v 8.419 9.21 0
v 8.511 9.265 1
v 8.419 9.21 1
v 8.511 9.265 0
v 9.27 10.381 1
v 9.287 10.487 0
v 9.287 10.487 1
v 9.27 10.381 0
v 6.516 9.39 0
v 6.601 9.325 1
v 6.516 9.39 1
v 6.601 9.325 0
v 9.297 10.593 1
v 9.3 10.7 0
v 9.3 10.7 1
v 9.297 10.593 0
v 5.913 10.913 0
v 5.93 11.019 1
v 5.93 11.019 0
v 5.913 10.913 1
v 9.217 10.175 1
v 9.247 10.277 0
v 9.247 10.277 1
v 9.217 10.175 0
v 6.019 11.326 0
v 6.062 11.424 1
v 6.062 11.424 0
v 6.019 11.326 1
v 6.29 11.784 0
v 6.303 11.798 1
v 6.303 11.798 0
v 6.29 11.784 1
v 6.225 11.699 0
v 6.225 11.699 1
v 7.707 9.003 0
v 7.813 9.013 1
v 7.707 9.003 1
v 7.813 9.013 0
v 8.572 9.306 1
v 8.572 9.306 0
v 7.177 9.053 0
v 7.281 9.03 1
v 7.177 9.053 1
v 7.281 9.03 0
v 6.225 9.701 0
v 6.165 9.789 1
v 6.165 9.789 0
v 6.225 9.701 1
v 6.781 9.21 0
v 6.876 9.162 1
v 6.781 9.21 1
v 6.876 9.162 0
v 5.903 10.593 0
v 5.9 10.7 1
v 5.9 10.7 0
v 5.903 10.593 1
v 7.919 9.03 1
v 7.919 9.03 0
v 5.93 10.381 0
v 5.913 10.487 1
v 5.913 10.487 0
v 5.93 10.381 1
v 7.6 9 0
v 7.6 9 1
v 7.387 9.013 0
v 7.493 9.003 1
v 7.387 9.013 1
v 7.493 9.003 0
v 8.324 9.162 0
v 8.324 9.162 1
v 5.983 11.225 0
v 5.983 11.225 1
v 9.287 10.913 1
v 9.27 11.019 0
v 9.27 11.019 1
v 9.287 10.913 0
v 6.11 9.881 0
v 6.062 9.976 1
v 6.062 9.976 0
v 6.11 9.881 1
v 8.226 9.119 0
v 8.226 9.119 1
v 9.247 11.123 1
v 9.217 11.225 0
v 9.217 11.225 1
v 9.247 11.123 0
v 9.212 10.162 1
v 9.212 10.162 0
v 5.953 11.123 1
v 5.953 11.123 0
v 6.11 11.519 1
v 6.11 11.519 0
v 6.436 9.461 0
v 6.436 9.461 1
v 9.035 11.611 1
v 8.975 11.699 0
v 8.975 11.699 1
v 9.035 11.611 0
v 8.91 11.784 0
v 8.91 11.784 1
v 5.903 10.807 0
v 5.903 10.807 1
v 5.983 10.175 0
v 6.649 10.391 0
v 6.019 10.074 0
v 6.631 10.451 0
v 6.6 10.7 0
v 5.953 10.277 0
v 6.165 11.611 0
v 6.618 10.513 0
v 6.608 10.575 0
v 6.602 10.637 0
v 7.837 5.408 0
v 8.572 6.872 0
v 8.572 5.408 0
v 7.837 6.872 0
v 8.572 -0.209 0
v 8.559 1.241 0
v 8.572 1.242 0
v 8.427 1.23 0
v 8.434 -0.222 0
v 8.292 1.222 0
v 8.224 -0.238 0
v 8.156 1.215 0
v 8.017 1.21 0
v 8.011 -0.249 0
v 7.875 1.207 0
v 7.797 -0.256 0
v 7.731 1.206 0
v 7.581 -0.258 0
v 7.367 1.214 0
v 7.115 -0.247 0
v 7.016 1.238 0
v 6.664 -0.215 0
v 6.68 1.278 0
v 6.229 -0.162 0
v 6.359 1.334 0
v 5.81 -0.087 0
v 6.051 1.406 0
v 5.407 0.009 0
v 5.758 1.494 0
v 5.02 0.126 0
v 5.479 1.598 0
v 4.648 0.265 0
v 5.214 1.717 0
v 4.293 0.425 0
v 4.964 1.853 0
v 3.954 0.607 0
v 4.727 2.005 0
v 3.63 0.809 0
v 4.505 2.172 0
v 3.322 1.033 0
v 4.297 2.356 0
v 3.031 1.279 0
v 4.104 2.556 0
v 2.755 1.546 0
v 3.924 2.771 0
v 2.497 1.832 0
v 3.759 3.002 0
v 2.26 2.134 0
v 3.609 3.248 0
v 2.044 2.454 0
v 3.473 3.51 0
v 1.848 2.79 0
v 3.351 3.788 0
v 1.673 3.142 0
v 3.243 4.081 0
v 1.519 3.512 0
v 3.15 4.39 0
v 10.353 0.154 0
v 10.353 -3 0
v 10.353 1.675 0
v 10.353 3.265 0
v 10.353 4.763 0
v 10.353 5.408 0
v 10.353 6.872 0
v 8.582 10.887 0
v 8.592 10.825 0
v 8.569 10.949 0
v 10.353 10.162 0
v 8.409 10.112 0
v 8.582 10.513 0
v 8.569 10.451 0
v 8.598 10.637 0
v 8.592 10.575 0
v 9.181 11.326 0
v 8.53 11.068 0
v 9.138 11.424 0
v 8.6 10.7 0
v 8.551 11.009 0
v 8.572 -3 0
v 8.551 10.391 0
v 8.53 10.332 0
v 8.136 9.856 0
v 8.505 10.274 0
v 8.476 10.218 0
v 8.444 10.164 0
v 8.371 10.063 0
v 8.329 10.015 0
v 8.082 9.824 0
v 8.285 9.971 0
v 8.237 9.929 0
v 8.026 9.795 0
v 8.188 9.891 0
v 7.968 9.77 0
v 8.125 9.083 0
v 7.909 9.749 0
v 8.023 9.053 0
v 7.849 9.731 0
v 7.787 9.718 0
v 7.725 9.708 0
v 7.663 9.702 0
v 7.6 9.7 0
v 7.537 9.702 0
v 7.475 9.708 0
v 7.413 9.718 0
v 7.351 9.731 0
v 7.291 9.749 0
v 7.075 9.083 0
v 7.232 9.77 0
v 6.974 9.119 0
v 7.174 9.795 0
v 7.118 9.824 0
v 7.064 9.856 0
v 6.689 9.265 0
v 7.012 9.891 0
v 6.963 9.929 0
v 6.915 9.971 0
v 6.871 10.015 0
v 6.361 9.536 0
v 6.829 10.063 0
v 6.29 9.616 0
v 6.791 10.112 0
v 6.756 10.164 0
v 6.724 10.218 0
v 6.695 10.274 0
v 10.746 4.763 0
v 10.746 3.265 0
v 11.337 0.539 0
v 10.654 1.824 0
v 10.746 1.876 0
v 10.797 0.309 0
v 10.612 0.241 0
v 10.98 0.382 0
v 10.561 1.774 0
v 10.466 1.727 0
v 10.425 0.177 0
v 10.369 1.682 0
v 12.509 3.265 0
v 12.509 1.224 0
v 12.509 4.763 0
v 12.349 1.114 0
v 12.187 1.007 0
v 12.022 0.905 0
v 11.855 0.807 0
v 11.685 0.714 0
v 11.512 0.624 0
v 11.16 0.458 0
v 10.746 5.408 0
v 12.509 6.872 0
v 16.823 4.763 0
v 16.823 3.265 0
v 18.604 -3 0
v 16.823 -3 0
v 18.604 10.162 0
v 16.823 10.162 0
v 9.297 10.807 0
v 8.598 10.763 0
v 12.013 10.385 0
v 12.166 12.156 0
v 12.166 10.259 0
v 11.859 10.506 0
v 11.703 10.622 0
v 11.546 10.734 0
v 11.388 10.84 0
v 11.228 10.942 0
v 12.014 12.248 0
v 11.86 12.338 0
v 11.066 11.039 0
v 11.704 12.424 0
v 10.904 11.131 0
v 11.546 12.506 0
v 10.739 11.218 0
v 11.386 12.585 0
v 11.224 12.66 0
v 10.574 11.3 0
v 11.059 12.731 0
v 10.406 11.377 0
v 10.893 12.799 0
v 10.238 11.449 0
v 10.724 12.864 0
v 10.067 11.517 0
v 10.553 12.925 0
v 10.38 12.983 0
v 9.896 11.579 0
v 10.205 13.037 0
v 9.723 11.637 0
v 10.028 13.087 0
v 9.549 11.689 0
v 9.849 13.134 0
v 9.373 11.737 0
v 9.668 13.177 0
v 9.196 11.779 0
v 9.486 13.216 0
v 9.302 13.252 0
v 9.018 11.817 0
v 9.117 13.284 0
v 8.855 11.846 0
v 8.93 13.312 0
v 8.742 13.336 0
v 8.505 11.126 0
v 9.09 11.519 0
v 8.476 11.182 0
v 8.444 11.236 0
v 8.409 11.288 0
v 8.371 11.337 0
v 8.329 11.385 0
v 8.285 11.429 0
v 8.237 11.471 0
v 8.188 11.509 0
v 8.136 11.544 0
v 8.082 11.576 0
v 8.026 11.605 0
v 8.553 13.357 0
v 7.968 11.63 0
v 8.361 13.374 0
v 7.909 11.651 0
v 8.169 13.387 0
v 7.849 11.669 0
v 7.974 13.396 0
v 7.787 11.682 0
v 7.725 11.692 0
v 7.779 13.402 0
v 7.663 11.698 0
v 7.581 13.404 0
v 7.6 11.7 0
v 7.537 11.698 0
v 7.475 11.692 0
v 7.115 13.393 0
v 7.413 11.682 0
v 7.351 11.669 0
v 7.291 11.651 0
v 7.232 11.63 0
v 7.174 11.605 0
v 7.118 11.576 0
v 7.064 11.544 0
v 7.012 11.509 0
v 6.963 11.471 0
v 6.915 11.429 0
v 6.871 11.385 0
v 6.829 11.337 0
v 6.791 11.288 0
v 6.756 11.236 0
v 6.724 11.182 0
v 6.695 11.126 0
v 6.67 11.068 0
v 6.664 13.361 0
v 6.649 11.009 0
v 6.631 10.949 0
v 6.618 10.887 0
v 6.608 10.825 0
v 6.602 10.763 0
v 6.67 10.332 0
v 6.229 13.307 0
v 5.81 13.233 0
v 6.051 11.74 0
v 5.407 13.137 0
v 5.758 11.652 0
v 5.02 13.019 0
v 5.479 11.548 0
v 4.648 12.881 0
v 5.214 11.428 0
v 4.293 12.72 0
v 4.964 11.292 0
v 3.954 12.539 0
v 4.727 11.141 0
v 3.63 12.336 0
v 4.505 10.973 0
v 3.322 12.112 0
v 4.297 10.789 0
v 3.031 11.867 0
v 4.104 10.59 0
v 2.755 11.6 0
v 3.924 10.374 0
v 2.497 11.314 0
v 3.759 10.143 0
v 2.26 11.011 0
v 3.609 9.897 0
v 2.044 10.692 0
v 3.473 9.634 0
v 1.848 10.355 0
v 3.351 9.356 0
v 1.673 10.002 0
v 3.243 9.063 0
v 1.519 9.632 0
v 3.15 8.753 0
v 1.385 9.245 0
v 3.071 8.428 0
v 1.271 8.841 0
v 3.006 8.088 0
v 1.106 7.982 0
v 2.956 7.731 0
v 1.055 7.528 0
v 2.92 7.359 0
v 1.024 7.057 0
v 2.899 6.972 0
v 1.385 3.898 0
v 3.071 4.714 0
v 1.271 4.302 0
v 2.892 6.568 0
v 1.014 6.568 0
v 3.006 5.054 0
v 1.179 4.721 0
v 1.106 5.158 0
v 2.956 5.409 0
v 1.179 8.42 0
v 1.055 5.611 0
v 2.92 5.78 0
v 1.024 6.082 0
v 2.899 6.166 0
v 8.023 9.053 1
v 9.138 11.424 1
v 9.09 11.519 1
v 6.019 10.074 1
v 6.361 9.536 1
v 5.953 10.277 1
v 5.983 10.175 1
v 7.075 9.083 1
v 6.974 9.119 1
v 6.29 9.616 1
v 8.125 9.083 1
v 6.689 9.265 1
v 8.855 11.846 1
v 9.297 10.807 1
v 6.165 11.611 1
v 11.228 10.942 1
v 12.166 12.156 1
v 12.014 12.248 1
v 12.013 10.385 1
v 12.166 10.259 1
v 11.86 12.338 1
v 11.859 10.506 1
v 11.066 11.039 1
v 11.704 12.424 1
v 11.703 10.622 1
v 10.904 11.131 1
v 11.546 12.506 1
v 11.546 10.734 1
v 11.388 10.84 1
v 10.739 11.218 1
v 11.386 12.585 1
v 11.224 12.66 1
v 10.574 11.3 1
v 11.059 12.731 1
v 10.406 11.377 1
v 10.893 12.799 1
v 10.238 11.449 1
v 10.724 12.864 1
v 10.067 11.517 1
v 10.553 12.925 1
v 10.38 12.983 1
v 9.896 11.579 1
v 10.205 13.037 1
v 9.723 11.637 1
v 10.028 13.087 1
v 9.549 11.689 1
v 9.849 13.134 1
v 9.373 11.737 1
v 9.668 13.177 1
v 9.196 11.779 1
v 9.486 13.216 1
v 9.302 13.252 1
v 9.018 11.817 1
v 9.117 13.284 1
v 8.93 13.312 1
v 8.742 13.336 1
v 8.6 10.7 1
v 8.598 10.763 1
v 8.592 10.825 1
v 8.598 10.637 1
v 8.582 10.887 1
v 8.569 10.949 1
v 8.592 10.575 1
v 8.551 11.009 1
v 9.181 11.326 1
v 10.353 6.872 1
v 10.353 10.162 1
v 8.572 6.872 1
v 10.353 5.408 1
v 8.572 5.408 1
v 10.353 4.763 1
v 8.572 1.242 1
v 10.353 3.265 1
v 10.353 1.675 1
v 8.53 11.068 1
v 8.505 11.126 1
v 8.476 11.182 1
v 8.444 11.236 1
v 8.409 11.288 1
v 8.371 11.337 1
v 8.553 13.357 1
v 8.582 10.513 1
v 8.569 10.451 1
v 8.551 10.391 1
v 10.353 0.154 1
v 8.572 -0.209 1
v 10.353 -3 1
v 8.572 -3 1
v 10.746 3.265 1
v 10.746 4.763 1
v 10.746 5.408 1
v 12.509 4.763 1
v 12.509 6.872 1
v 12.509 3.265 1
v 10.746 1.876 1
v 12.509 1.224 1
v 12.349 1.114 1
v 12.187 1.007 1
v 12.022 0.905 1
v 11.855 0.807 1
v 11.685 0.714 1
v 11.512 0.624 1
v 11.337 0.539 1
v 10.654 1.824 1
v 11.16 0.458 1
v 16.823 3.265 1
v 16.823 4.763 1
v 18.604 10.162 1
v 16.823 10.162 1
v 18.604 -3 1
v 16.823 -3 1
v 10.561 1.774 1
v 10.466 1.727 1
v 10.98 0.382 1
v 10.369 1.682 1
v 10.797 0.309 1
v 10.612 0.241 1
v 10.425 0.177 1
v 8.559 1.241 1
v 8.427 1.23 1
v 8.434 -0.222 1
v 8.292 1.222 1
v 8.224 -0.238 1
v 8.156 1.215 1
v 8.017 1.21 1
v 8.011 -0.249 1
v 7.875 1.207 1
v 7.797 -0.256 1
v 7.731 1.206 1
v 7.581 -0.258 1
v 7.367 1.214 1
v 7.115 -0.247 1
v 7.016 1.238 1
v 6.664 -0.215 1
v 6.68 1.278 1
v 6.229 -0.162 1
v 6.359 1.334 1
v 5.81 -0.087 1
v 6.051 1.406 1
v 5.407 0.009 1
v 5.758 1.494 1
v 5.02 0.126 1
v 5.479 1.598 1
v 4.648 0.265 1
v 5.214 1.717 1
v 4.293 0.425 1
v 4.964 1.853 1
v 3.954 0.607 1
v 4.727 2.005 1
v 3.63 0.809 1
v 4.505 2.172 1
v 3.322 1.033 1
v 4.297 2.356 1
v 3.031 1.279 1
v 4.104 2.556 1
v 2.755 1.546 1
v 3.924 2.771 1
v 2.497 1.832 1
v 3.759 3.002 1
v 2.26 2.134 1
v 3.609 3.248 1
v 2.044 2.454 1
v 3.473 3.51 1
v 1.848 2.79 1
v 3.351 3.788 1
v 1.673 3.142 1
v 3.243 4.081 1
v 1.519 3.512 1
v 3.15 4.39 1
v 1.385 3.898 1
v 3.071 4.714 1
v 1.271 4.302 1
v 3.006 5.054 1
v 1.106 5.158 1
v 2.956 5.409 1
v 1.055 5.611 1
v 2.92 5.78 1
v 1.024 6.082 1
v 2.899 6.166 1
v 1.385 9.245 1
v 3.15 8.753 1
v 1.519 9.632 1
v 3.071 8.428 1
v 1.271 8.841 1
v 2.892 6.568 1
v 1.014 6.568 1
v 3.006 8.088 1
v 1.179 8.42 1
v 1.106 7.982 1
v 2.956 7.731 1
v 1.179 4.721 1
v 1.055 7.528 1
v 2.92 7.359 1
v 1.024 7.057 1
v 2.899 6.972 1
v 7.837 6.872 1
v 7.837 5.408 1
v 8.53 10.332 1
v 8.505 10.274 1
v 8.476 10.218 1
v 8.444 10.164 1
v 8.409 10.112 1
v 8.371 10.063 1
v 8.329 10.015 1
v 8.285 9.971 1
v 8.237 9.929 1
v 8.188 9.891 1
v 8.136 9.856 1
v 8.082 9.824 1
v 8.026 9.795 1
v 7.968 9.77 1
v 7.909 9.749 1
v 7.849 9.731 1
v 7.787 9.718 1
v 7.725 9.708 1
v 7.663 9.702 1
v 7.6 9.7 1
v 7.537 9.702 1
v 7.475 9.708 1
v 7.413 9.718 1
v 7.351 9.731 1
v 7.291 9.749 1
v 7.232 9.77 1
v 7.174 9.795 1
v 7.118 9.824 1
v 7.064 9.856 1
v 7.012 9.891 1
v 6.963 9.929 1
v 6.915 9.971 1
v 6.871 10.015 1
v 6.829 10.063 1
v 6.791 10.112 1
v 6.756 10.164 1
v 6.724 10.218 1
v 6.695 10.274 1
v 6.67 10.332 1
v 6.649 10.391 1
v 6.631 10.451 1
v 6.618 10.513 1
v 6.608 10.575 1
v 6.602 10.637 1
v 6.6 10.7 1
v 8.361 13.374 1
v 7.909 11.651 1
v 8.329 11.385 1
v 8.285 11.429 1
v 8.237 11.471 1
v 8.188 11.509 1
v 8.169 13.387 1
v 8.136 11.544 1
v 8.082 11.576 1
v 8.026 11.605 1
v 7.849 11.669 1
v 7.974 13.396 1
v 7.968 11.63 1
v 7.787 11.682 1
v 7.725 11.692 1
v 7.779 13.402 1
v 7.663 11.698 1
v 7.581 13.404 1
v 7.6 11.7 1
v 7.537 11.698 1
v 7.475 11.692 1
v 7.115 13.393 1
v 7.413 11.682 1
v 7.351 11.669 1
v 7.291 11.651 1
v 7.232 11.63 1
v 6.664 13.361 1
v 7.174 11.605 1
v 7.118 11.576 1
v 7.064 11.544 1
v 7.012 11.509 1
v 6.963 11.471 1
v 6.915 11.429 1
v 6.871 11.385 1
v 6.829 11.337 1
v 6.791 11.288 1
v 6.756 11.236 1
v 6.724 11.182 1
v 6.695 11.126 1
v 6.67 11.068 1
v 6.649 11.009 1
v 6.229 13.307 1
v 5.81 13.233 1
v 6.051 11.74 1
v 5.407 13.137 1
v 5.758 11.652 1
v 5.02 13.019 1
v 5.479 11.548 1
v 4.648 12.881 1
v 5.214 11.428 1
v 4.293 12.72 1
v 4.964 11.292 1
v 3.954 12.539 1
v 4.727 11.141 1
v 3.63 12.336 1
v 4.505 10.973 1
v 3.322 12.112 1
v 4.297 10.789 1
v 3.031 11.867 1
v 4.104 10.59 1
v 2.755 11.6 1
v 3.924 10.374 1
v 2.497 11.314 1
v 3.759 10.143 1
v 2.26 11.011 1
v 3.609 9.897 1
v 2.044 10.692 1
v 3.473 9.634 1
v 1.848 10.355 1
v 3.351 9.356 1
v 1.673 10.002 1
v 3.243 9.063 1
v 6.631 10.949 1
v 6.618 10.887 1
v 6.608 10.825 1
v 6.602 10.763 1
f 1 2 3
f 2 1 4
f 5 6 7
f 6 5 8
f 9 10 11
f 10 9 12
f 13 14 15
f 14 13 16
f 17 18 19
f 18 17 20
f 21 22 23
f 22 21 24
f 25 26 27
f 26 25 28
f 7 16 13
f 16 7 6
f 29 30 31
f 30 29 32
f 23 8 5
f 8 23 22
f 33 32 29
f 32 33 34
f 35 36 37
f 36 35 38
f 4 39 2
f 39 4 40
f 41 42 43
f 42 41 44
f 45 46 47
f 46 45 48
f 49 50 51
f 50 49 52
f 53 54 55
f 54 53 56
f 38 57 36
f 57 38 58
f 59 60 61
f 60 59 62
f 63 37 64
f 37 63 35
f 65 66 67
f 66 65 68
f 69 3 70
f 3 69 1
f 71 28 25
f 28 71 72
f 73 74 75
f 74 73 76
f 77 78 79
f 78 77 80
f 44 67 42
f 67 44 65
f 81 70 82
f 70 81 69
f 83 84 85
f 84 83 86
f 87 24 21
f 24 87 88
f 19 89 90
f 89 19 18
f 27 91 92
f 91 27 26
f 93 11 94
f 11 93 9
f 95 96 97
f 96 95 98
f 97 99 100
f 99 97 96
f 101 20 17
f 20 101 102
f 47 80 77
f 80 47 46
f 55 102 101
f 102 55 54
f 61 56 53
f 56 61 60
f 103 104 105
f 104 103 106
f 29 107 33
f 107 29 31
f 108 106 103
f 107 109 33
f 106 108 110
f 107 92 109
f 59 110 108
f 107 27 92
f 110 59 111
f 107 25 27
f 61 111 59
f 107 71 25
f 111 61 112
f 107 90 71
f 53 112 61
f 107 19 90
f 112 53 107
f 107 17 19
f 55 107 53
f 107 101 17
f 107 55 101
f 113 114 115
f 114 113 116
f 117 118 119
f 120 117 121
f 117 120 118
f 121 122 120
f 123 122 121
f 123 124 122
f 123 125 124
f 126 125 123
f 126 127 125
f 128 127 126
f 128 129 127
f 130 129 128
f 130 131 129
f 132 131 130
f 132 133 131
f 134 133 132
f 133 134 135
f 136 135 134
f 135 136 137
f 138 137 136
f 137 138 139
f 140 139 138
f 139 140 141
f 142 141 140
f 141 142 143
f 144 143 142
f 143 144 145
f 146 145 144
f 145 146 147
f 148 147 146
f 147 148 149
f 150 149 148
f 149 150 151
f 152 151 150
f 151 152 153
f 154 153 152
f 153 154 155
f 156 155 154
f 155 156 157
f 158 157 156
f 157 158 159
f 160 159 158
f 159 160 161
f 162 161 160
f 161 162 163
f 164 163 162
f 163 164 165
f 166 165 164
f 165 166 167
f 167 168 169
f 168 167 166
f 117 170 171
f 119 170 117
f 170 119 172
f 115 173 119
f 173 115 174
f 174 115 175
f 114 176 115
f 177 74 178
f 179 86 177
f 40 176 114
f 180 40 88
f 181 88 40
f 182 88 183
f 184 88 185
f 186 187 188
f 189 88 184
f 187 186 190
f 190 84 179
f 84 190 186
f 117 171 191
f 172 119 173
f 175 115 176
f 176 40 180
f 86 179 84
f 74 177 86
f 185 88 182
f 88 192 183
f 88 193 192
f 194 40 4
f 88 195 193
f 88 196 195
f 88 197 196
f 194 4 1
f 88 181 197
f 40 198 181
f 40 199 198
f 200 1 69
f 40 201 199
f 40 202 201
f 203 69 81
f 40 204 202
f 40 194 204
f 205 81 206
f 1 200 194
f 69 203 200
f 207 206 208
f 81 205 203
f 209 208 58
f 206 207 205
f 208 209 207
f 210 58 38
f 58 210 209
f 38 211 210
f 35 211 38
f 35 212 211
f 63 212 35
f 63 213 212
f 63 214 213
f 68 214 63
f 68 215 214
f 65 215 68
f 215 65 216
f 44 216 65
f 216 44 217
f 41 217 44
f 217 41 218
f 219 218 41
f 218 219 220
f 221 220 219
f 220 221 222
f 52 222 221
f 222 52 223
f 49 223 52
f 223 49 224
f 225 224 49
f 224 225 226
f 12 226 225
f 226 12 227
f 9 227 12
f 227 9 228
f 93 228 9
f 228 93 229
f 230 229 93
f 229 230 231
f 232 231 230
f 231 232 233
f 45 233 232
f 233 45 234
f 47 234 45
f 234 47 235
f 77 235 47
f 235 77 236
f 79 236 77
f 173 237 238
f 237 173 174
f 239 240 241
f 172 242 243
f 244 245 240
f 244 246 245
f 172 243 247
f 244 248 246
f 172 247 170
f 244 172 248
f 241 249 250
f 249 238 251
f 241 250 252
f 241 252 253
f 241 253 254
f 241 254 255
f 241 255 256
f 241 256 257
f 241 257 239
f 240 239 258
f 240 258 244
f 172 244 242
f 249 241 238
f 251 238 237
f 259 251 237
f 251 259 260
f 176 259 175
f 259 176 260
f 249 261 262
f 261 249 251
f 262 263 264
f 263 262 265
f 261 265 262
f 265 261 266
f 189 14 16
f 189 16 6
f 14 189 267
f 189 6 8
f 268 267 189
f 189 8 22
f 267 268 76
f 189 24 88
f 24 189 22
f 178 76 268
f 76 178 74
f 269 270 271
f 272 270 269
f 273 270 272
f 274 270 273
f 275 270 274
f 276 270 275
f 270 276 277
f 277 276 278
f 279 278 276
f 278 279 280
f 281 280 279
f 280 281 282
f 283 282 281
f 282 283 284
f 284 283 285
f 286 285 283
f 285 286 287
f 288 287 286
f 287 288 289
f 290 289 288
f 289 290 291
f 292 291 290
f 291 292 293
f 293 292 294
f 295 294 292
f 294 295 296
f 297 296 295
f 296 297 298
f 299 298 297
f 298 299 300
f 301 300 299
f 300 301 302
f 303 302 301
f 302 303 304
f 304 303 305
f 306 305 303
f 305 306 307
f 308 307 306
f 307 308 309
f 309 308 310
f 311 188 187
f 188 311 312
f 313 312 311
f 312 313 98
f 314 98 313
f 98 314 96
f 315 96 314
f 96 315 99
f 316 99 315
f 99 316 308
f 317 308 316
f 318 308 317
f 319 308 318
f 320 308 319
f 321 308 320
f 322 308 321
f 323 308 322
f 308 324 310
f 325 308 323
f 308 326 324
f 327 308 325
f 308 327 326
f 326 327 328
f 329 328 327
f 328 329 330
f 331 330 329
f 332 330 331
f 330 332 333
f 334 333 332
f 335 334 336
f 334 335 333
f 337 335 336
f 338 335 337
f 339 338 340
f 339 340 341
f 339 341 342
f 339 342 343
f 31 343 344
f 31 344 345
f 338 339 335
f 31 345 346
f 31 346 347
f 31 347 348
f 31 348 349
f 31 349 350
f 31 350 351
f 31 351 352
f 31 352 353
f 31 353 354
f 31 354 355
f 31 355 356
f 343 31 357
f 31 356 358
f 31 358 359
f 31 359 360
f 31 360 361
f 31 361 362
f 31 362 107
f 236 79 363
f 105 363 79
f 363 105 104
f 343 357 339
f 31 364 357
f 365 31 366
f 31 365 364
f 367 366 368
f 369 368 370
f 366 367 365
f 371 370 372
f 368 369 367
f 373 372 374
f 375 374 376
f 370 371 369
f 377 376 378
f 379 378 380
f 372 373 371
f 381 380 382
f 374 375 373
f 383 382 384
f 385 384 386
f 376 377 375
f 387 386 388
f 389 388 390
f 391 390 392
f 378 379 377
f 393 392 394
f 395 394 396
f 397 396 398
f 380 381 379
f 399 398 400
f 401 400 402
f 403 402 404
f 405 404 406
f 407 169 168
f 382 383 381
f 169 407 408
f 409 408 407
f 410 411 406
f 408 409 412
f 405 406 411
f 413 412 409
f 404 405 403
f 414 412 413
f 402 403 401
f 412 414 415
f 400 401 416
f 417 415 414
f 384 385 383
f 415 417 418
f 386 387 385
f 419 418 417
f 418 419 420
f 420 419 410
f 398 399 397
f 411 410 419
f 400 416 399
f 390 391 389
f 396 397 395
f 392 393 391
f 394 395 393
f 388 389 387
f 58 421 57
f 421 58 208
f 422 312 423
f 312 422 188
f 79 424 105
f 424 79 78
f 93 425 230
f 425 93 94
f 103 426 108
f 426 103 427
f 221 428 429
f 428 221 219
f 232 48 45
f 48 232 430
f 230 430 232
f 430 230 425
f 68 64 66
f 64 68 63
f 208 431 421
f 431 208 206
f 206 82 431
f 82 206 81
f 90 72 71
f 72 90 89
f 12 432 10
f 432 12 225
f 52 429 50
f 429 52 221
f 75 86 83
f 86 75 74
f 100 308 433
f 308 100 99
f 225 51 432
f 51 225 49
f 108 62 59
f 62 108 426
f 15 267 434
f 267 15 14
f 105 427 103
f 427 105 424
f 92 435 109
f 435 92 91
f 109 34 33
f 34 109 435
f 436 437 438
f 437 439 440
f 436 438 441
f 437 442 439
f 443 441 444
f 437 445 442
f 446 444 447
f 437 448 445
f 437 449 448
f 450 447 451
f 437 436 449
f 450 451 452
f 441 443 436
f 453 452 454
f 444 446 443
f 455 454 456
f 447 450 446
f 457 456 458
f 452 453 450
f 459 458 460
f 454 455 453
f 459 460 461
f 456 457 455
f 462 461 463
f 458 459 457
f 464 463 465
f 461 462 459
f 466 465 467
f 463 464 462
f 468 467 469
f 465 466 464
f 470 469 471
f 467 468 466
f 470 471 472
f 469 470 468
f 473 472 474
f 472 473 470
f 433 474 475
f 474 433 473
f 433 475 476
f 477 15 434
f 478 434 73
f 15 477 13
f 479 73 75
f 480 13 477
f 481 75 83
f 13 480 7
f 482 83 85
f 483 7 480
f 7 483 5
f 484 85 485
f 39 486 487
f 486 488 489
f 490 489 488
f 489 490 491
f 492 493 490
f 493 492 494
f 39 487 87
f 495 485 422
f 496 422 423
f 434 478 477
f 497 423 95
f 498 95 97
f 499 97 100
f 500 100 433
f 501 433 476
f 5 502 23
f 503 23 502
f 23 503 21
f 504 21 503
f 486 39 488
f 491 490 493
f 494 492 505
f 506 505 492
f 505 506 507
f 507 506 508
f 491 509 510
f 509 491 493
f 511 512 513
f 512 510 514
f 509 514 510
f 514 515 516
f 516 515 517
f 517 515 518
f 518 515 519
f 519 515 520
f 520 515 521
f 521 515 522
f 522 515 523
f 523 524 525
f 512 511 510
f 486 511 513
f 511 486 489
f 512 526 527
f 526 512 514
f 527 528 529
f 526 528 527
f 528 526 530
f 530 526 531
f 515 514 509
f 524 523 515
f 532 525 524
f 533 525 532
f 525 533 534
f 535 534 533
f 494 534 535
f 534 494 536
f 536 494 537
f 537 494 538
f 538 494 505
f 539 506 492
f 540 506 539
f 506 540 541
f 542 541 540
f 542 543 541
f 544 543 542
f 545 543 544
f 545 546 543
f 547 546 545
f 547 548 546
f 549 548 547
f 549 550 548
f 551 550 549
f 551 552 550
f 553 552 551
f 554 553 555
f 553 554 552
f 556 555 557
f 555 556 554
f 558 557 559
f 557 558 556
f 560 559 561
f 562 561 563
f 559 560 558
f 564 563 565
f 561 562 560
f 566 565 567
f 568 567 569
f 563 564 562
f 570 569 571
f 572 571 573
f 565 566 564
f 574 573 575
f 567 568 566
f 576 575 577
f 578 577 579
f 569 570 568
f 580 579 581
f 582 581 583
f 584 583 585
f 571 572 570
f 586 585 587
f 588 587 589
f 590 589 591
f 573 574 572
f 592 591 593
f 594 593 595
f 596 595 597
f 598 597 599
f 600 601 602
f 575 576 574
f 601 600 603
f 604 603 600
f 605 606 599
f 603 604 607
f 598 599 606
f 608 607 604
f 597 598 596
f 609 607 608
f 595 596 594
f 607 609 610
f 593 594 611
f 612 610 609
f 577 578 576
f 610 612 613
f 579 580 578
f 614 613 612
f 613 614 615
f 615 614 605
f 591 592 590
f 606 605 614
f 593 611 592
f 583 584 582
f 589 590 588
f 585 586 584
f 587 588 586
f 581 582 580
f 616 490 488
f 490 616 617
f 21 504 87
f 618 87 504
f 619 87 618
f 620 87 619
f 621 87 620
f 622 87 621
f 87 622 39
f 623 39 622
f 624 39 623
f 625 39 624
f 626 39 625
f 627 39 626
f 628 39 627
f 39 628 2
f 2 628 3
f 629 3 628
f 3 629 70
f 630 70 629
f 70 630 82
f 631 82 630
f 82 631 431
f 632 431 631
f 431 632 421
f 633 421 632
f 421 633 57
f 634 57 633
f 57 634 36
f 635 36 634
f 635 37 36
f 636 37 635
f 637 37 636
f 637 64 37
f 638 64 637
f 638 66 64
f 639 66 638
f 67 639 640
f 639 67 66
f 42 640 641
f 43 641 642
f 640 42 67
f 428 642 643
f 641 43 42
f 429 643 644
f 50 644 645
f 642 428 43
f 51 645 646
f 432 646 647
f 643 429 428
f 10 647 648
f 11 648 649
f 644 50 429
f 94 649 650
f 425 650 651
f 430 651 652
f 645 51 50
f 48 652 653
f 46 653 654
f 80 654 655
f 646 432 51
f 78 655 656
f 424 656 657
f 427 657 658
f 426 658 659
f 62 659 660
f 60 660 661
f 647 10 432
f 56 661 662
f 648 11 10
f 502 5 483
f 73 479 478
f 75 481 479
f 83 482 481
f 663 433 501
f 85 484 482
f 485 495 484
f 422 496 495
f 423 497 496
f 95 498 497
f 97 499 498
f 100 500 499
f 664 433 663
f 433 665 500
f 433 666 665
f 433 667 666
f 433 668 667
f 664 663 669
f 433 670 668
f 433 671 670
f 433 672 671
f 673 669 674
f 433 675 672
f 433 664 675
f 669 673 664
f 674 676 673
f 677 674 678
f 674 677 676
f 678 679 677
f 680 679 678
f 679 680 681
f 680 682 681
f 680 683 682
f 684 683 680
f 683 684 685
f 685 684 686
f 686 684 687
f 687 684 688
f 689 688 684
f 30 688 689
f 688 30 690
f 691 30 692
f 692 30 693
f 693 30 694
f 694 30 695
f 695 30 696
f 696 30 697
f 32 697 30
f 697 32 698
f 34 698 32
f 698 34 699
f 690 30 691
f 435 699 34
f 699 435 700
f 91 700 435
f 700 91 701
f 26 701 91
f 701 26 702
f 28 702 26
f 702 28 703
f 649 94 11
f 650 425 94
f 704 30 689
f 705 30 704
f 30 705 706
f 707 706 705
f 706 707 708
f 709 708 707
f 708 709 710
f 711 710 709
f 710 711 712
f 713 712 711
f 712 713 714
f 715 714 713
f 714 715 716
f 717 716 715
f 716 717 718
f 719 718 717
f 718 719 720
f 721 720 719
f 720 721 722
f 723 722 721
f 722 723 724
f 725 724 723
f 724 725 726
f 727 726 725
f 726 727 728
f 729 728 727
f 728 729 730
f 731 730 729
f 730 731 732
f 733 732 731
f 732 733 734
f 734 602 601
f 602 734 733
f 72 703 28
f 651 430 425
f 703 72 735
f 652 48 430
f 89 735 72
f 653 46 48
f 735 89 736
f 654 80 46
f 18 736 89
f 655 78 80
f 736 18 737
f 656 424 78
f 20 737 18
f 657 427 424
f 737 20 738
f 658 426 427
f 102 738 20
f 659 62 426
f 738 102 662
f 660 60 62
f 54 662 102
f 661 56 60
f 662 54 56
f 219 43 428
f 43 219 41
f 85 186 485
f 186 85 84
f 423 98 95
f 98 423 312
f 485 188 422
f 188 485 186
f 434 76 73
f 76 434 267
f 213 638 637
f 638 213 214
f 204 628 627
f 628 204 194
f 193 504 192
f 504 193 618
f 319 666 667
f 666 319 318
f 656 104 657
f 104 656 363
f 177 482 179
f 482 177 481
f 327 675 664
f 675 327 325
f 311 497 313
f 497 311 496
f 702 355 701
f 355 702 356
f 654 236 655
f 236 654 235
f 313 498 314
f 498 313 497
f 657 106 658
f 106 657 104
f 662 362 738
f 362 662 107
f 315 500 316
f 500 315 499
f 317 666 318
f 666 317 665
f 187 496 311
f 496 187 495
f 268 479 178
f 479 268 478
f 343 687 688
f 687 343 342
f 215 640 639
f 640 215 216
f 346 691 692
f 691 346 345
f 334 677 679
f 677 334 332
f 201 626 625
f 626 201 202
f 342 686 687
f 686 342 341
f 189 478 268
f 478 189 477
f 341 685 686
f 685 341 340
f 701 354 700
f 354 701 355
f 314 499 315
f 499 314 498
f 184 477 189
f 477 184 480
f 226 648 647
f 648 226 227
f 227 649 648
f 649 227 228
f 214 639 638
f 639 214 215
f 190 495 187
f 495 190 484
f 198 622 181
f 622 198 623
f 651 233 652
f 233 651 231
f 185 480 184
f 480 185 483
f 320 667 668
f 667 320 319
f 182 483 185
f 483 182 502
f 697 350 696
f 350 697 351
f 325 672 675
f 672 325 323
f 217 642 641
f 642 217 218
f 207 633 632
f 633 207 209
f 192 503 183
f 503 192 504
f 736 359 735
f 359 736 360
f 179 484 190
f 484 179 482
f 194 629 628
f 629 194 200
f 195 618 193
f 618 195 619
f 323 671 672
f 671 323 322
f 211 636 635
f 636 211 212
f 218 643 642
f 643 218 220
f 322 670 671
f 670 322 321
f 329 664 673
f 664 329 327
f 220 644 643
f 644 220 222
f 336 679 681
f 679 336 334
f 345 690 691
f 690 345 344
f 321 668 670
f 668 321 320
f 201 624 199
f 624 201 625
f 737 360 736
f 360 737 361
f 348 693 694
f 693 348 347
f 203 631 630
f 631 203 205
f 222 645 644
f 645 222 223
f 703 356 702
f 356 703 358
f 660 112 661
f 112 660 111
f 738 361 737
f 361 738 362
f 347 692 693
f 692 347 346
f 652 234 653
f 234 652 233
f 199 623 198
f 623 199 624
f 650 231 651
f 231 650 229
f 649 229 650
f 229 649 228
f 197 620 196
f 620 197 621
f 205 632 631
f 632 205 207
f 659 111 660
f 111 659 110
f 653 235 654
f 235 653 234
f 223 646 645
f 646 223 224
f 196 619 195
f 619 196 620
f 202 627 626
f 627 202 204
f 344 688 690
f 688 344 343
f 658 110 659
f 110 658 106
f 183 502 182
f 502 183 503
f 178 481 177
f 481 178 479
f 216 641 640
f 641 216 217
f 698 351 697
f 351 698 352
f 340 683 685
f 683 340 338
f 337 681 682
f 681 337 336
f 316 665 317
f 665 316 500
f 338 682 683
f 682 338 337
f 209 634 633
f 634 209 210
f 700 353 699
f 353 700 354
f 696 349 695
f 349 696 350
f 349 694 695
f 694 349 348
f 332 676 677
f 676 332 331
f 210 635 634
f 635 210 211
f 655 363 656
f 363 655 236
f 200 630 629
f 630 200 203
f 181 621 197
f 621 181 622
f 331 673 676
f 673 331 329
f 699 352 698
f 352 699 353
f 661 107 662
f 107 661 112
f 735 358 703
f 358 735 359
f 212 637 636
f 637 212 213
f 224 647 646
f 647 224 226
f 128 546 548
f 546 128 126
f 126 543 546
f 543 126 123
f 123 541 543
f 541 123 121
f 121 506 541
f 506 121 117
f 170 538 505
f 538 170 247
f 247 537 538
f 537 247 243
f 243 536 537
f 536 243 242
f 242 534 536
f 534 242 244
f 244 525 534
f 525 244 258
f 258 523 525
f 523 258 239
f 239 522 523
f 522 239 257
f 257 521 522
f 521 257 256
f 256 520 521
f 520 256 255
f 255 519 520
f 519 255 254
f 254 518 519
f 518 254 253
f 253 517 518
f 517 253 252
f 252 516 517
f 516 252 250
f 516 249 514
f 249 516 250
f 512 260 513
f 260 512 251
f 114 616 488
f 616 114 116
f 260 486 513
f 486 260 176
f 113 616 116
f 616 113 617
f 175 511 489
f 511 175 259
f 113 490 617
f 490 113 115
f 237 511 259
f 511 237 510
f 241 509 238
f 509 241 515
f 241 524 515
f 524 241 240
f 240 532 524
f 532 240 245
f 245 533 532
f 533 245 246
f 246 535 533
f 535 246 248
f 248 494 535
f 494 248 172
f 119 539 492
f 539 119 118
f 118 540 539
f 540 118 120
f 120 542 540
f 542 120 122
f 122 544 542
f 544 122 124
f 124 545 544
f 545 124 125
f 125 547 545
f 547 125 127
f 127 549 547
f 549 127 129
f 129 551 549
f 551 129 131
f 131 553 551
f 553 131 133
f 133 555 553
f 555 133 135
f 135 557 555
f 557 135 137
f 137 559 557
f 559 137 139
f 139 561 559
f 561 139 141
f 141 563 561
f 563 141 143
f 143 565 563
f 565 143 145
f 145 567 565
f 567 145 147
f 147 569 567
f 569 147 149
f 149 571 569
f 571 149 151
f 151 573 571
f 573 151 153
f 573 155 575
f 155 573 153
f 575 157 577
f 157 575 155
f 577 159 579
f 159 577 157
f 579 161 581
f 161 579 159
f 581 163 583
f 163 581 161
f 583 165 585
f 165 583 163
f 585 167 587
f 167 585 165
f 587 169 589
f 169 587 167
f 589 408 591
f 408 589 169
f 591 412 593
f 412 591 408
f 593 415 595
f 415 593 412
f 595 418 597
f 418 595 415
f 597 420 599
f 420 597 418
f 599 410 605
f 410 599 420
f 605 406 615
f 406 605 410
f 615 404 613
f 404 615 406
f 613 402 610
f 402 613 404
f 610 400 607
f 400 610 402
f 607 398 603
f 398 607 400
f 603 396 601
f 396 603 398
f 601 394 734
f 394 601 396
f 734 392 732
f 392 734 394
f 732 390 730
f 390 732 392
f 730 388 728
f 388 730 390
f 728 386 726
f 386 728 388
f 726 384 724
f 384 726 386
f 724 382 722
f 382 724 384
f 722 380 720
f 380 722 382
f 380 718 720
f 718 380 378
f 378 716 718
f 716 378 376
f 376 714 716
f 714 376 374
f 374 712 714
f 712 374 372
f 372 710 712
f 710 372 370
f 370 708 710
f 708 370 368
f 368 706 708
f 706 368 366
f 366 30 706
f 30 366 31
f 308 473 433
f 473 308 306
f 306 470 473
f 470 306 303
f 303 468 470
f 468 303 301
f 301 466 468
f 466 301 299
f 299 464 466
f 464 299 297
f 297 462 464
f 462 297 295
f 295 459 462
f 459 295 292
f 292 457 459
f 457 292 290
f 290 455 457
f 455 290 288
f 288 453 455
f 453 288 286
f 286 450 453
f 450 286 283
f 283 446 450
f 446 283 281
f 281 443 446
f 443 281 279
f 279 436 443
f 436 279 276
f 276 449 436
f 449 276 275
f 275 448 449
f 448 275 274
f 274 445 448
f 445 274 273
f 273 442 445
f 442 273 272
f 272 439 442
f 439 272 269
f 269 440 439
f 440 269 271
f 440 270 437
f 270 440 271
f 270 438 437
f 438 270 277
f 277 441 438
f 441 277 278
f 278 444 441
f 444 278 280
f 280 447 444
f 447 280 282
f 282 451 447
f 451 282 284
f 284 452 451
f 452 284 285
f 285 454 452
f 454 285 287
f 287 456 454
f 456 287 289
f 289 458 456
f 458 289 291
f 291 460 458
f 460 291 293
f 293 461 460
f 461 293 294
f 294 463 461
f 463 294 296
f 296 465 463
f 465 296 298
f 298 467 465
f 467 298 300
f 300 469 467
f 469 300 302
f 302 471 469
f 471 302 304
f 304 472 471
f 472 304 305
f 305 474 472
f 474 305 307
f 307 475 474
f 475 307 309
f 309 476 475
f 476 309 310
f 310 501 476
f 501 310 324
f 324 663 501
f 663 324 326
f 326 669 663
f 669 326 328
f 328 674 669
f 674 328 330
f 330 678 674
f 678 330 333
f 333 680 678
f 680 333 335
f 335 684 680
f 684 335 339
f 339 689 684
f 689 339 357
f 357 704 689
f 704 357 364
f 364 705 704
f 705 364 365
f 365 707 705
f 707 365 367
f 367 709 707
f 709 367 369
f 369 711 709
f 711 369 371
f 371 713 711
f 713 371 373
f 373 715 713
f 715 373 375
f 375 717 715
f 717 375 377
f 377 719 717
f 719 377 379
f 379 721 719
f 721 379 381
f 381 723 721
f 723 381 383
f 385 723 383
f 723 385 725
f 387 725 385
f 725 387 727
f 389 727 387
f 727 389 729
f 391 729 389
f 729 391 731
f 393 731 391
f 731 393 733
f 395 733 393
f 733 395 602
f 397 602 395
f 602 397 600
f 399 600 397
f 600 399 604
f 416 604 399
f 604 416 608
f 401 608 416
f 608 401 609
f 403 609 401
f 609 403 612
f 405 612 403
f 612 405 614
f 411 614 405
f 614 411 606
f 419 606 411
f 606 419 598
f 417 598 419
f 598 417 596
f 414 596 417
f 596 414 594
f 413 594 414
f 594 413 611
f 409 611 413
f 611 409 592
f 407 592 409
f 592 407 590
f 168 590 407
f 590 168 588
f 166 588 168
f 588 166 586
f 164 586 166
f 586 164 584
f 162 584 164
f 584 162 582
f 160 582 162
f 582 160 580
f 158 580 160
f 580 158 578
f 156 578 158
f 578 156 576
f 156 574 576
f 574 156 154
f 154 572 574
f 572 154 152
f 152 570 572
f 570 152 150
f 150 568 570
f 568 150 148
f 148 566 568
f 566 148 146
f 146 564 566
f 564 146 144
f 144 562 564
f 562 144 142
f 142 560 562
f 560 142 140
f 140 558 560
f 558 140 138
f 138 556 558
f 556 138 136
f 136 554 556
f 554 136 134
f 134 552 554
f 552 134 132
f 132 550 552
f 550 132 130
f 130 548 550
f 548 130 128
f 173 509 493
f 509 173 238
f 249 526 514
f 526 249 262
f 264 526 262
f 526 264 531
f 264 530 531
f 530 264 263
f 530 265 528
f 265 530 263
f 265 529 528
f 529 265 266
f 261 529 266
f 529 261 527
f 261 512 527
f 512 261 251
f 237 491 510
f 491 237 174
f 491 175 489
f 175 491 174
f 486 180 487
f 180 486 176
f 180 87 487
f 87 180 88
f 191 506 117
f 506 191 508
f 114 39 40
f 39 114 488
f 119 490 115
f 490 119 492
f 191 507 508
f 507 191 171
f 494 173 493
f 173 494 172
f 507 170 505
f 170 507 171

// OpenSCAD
// GH logo keychain CAD file Copyright (C) 2024 kernaltrap8
// Code licensed under GNU GPLv3
// The license document can be viewed at
// https://www.gnu.org/licenses/gpl-3.0.en.html

$fn = 100;
ornament_xyz = [7.6, 10.7, 0];

module keychain_p1() {
    translate([0, 0, 0]) {
        linear_extrude(1) {
            text("G", size = 13, font = "Nightmare Hero");
        }
    }
}

module keychain_p2() {
    translate([6.8, -3, 0]) {
        linear_extrude(1) {
            text("H", size = 13, font = "Nightmare Hero");
        }
    }
}

module ornament() {
	difference() {
    	translate(ornament_xyz) {
            linear_extrude(1) {
                circle(r = 1.7);
            }
        }
        translate(ornament_xyz) {
            cylinder(h = 1);
        }
    }
}

keychain_p1();
keychain_p2();
ornament();
